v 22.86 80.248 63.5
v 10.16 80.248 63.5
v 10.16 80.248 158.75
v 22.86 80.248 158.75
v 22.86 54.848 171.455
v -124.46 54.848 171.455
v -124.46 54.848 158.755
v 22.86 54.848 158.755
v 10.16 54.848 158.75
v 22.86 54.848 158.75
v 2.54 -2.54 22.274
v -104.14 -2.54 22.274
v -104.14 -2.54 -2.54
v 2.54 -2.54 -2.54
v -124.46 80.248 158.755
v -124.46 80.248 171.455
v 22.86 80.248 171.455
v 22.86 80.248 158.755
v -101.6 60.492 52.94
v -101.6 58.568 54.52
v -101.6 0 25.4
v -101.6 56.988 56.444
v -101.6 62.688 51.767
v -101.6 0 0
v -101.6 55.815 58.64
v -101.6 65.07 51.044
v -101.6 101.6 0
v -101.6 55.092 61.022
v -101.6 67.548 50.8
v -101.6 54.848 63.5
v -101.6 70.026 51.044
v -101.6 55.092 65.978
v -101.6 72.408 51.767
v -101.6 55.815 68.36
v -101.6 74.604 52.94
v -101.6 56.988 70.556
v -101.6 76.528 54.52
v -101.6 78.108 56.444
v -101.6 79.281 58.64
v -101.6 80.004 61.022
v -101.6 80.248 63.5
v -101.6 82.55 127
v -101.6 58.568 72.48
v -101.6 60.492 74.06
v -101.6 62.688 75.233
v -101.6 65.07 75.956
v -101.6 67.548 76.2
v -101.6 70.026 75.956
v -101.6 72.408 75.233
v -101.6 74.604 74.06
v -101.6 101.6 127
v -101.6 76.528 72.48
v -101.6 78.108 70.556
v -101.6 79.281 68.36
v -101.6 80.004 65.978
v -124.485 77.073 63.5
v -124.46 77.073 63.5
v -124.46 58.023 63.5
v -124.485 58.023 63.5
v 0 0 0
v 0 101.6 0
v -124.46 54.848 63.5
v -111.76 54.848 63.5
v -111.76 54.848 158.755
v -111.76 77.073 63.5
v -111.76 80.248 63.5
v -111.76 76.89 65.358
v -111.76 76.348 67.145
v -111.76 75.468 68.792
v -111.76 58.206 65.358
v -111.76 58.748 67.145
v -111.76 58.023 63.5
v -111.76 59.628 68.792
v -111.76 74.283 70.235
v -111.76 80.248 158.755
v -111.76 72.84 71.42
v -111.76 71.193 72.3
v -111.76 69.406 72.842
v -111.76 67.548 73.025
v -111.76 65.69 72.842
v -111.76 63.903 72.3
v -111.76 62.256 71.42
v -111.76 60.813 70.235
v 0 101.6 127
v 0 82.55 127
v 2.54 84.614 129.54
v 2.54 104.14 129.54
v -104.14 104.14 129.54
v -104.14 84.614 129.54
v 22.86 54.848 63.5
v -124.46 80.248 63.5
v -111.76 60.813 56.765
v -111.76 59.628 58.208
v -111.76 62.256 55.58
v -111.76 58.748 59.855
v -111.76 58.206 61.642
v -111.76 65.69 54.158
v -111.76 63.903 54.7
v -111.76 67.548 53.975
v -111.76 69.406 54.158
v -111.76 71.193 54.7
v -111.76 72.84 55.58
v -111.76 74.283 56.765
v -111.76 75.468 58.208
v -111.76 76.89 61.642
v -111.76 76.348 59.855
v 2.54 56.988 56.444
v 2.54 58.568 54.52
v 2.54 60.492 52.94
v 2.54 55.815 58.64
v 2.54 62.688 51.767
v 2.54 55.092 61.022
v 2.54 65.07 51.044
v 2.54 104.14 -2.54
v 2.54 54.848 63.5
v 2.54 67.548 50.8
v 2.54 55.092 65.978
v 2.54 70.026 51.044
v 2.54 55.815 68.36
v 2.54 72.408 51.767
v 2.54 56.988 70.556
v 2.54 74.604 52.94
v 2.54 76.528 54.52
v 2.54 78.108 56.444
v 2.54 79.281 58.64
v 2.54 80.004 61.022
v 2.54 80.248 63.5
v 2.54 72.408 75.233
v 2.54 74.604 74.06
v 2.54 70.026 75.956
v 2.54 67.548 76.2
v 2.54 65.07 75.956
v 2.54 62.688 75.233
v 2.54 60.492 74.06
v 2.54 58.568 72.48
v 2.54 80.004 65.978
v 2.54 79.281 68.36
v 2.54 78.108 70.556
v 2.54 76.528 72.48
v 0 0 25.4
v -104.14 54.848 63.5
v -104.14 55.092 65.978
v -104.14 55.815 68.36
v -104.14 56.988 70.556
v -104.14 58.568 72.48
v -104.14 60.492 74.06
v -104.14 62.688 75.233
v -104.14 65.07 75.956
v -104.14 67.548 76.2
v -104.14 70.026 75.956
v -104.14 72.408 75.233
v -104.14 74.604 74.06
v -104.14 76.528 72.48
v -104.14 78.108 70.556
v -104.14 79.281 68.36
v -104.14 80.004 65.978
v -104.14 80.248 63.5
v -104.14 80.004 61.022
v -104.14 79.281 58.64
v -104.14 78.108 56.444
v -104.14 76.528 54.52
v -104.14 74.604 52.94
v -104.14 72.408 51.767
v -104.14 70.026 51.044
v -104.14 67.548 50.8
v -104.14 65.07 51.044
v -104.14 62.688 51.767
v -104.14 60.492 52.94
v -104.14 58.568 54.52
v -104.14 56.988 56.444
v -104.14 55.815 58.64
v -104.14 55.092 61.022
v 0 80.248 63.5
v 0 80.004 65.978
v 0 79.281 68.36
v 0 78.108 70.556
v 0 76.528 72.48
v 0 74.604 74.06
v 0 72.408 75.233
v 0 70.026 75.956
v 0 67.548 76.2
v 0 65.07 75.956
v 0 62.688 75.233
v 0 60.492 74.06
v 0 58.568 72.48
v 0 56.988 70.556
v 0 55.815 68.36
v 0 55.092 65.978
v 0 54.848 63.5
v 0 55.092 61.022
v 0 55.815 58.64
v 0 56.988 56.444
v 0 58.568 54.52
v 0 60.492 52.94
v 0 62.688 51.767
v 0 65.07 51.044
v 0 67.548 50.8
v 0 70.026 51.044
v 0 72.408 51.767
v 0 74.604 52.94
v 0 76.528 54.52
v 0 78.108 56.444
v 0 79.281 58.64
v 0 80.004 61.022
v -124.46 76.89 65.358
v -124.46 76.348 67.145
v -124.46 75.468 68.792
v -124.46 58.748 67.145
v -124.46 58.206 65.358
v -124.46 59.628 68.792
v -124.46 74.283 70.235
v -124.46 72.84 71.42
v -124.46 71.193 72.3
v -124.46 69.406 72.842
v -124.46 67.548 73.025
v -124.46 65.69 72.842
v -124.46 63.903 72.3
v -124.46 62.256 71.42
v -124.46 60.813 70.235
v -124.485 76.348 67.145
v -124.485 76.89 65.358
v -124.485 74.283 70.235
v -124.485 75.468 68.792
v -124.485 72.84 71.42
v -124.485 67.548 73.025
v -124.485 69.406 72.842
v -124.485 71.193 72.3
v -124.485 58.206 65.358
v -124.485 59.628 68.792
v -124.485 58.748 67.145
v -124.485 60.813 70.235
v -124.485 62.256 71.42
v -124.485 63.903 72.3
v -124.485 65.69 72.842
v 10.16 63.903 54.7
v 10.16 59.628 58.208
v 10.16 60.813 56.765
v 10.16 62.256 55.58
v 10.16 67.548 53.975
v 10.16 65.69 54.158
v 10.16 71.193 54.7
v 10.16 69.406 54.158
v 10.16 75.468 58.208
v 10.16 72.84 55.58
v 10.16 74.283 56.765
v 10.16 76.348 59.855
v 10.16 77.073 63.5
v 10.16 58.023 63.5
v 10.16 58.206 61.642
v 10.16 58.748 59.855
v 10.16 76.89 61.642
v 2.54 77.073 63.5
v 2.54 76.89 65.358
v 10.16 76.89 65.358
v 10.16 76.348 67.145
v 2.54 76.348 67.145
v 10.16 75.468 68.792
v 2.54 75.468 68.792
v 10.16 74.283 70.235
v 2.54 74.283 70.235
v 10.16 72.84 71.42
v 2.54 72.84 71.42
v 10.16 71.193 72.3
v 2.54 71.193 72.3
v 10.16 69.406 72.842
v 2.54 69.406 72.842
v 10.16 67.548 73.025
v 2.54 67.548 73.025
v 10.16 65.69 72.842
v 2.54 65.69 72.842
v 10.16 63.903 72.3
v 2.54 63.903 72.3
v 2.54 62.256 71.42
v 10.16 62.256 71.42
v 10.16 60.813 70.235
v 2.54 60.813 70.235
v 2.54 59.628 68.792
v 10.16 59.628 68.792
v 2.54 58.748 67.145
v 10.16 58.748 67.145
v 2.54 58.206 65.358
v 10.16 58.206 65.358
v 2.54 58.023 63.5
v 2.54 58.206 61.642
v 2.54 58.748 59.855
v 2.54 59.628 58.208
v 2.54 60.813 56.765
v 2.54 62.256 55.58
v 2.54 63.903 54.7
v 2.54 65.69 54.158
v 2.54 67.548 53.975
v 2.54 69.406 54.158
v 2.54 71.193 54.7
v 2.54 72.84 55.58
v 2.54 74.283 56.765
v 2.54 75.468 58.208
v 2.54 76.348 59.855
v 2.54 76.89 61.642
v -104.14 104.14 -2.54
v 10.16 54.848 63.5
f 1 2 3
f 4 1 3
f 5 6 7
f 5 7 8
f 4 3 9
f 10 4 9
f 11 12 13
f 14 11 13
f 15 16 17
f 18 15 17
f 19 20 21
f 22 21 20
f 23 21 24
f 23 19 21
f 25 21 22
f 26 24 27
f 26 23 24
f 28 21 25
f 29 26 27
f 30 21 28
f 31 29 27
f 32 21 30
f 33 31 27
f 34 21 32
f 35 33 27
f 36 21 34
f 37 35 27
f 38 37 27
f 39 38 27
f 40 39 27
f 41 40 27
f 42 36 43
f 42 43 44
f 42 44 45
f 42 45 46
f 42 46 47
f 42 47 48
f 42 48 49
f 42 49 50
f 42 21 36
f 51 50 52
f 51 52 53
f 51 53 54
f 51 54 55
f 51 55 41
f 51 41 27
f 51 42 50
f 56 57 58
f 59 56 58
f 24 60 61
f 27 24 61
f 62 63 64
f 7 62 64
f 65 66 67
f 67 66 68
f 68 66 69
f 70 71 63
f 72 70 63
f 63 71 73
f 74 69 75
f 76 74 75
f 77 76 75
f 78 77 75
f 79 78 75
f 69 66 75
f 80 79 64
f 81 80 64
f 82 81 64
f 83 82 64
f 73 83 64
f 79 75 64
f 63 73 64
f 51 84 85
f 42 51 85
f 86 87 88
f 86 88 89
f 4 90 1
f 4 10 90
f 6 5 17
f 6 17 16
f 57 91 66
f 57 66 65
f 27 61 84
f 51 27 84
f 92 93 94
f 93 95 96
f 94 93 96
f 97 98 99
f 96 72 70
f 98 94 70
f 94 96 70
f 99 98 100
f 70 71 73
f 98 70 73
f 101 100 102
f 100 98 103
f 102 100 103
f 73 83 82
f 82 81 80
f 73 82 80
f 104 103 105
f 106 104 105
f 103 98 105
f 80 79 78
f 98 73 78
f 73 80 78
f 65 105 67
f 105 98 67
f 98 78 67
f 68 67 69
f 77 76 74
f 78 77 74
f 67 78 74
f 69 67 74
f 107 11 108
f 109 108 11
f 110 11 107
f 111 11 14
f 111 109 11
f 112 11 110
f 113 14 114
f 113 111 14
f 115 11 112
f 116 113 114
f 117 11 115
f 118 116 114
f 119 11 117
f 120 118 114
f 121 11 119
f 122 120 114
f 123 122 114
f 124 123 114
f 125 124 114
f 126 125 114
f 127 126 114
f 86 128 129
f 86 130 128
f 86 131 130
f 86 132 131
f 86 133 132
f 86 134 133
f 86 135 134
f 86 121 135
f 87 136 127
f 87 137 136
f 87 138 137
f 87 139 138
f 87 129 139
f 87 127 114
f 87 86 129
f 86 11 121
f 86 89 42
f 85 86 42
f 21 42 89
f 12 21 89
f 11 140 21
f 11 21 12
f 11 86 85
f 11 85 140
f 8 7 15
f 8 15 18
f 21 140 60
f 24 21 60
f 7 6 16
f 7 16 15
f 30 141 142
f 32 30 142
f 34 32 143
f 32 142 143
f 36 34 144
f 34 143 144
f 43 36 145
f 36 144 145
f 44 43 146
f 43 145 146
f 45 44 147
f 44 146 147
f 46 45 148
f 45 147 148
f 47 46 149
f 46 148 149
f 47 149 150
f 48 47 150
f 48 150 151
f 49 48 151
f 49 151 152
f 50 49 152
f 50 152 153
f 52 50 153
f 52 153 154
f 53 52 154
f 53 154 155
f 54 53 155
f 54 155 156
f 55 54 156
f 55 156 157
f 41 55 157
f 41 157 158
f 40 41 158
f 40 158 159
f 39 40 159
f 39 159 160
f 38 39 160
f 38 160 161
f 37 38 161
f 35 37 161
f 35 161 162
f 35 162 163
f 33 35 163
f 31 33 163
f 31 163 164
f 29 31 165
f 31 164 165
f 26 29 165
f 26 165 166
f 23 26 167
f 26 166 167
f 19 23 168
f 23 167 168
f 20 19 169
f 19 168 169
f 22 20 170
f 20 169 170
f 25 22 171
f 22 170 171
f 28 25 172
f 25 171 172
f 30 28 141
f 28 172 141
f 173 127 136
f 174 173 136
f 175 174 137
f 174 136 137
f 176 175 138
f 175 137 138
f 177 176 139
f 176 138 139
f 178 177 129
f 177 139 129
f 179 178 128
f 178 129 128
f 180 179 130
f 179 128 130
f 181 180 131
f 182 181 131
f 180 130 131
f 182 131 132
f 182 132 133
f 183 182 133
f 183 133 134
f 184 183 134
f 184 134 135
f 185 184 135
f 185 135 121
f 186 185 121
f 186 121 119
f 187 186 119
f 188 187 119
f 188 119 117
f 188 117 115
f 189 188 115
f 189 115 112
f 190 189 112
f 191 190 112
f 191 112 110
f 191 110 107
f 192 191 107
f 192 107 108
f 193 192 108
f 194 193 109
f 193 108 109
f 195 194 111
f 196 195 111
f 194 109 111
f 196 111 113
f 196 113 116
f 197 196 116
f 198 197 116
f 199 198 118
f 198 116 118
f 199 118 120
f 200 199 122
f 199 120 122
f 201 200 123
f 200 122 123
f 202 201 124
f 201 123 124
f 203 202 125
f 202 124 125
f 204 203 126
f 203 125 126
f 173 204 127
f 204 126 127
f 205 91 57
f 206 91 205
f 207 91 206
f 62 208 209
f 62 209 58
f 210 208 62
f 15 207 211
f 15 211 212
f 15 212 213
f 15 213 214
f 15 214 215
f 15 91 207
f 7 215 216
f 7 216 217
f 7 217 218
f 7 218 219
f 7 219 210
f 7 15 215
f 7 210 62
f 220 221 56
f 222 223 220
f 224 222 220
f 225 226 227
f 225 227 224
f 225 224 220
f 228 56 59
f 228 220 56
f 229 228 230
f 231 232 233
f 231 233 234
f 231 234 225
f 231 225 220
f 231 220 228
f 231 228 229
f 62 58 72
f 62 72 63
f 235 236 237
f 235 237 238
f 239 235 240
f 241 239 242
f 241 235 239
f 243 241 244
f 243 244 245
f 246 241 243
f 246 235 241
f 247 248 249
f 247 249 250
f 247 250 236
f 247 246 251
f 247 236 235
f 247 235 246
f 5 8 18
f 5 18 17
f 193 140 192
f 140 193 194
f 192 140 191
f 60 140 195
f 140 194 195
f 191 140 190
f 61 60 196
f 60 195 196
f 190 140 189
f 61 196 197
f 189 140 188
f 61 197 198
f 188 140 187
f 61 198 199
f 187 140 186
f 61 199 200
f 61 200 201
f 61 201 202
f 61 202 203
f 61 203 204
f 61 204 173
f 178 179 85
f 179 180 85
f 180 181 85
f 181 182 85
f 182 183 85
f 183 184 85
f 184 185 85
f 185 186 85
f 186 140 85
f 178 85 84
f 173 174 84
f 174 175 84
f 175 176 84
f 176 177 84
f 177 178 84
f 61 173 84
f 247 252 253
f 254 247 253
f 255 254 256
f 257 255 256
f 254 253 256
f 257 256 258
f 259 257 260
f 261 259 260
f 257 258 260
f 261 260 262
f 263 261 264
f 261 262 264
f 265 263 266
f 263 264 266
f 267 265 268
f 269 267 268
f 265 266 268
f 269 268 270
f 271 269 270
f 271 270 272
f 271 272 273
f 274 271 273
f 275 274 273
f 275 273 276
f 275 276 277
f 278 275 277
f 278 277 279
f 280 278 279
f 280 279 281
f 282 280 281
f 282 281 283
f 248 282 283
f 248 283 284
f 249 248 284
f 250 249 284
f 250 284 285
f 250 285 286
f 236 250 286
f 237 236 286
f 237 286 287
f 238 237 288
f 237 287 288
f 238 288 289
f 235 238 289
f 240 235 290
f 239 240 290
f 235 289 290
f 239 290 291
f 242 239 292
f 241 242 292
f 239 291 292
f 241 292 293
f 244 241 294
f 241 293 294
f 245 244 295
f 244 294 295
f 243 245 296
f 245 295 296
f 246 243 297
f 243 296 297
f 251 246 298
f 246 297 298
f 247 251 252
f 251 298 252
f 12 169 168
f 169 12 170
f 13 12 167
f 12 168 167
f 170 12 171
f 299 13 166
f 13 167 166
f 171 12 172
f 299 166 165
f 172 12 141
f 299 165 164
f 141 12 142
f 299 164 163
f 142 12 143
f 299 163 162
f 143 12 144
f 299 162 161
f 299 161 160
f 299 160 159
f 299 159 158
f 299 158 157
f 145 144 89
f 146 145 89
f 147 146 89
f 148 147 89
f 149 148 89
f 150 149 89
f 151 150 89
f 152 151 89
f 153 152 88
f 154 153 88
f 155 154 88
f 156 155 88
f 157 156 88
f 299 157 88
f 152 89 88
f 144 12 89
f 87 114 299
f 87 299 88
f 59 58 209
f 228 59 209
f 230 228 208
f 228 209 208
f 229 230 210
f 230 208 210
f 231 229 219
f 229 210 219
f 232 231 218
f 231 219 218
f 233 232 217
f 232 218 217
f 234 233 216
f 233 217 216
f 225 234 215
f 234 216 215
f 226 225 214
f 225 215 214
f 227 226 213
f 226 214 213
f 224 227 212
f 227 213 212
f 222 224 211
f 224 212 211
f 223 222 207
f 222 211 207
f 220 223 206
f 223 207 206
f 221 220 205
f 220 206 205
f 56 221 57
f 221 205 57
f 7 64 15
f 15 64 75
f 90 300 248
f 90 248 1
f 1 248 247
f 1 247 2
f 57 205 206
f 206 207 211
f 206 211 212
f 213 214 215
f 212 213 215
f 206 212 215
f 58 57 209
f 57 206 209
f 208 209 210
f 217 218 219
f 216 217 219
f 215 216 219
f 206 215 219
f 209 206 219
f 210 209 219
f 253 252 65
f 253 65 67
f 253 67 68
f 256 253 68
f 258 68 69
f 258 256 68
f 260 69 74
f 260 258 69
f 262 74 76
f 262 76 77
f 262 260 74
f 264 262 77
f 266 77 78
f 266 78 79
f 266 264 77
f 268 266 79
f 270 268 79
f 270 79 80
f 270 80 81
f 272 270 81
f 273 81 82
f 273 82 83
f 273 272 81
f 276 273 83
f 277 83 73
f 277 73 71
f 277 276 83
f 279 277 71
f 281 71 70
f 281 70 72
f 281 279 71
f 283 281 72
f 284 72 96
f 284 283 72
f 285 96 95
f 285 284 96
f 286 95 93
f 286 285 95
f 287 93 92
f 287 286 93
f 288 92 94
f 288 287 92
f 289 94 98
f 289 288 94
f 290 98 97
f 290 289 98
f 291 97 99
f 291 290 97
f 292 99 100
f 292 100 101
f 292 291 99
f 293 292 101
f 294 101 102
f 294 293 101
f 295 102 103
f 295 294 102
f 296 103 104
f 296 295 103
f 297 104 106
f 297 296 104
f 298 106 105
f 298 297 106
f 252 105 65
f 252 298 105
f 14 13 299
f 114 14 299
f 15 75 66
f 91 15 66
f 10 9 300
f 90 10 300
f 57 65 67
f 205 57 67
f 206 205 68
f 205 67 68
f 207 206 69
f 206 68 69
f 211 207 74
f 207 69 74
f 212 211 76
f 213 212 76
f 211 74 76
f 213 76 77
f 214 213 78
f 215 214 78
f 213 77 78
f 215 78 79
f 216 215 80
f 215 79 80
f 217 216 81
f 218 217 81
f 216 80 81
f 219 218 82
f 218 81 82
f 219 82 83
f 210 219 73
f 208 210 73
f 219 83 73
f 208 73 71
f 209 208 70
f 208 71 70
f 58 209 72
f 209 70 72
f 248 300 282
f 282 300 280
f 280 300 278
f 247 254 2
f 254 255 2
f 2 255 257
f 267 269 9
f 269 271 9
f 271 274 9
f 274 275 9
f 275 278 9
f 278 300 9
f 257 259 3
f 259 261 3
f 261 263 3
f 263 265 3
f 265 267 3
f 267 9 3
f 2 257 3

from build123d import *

# Parameters (mm, degrees)
F1_DEPTH  = 101.6
F2_T      = 2.54
F3_R      = 12.7
F4_DEPTH  = 101.6
F5_R      = 12.7
F6_DEPTH  = 101.6
F7_R      = 9.525
F8_DEPTH  = 114.3
F9_DEPTH  = 7.62
F11_DEPTH = 12.7
F13_DEPTH = 12.7
F15_DEPTH = 0.0254
F17_DEPTH = 25.4


with BuildPart() as f1:
    # F0 (on Right) → F1 (new body)
    with BuildSketch(Plane.YZ):
        Polygon((0, 25.4), (0, 0), (101.6, 0), (101.6, 127), (82.55, 127), align=None)
    extrude(amount=-F1_DEPTH)

    # F2
    f2_openings = [f1.faces().sort_by_distance(p)[0] for p in [
        (-50.8, 41.275, 76.2),
    ]]
    offset(amount=F2_T, openings=f2_openings, kind=Kind.INTERSECTION)

    # F3 (on face) → F4 (cut)
    with BuildSketch(Plane.YZ.offset(2.54)):
        with Locations((67.548125, 63.5)):
            Circle(F3_R)
    extrude(amount=-F4_DEPTH, mode=Mode.SUBTRACT)

    # F5 (on face) → F6 (cut)
    with BuildSketch(Plane(origin=(-104.14, 0, 0), x_dir=(0, -1, 0), z_dir=(-1, 0, 0))):
        with Locations((-67.548125, 63.5)):
            Circle(F5_R)
    extrude(amount=-F6_DEPTH, mode=Mode.SUBTRACT)


with BuildPart() as f8:
    # F7 (on face) → F8 (new body)
    with BuildSketch(Plane.YZ.offset(2.54)):
        with Locations((67.548125, 63.5)):
            Circle(F7_R)
    extrude(amount=-F8_DEPTH)

    # F9 (add): a face of the model
    f9_faces = [f8.faces().sort_by_distance(p)[0] for p in [
        (2.54, 67.548125, 63.5),
    ]]
    extrude(f9_faces, amount=F9_DEPTH)

    # F10 (on face) → F11 (join)
    with BuildSketch(Plane.YZ.offset(10.16)):
        Polygon((54.848125, 63.5), (67.548125, 63.5), (80.248125, 63.5), (80.248125, 158.75), (54.848125, 158.75), align=None)
    extrude(amount=F11_DEPTH)


with BuildPart() as f13:
    # F12 (on face) → F13 (new body)
    with BuildSketch(Plane(origin=(-111.76, 0, 0), x_dir=(0, -1, 0), z_dir=(-1, 0, 0))):
        with BuildLine():
            Line((-80.248125, 63.5), (-77.073125, 63.5))
            ThreePointArc((-77.073125, 63.5), (-67.548125, 73.025), (-58.023125, 63.5))
            Line((-58.023125, 63.5), (-54.848125, 63.5))
            Line((-54.848125, 63.5), (-54.848125, 158.7551236153))
            Line((-54.848125, 158.7551236153), (-80.248125, 158.7551236153))
            Line((-80.248125, 158.7551236153), (-80.248125, 63.5))
        make_face()
    extrude(amount=F13_DEPTH)


with BuildPart() as f15:
    # F14 (on face) → F15 (new body)
    with BuildSketch(Plane(origin=(-124.46, 0, 0), x_dir=(0, -1, 0), z_dir=(-1, 0, 0))):
        with BuildLine():
            ThreePointArc((-58.023125, 63.5), (-67.548125, 73.025), (-77.073125, 63.5))
            Line((-77.073125, 63.5), (-58.023125, 63.5))
        make_face()
    extrude(amount=F15_DEPTH)


with BuildPart() as f17:
    # F16 (on face) → F17 (new body)
    with BuildSketch(Plane.XZ.offset(-54.848125)):
        Polygon((-124.46, 171.4551236153), (-124.46, 158.7551236153), (-111.76, 158.7551236153), (22.86, 158.7551236153), (22.86, 171.4551236153), align=None)
    extrude(amount=-F17_DEPTH)


solid = Compound([f1.part, f8.part, f13.part, f15.part, f17.part])
